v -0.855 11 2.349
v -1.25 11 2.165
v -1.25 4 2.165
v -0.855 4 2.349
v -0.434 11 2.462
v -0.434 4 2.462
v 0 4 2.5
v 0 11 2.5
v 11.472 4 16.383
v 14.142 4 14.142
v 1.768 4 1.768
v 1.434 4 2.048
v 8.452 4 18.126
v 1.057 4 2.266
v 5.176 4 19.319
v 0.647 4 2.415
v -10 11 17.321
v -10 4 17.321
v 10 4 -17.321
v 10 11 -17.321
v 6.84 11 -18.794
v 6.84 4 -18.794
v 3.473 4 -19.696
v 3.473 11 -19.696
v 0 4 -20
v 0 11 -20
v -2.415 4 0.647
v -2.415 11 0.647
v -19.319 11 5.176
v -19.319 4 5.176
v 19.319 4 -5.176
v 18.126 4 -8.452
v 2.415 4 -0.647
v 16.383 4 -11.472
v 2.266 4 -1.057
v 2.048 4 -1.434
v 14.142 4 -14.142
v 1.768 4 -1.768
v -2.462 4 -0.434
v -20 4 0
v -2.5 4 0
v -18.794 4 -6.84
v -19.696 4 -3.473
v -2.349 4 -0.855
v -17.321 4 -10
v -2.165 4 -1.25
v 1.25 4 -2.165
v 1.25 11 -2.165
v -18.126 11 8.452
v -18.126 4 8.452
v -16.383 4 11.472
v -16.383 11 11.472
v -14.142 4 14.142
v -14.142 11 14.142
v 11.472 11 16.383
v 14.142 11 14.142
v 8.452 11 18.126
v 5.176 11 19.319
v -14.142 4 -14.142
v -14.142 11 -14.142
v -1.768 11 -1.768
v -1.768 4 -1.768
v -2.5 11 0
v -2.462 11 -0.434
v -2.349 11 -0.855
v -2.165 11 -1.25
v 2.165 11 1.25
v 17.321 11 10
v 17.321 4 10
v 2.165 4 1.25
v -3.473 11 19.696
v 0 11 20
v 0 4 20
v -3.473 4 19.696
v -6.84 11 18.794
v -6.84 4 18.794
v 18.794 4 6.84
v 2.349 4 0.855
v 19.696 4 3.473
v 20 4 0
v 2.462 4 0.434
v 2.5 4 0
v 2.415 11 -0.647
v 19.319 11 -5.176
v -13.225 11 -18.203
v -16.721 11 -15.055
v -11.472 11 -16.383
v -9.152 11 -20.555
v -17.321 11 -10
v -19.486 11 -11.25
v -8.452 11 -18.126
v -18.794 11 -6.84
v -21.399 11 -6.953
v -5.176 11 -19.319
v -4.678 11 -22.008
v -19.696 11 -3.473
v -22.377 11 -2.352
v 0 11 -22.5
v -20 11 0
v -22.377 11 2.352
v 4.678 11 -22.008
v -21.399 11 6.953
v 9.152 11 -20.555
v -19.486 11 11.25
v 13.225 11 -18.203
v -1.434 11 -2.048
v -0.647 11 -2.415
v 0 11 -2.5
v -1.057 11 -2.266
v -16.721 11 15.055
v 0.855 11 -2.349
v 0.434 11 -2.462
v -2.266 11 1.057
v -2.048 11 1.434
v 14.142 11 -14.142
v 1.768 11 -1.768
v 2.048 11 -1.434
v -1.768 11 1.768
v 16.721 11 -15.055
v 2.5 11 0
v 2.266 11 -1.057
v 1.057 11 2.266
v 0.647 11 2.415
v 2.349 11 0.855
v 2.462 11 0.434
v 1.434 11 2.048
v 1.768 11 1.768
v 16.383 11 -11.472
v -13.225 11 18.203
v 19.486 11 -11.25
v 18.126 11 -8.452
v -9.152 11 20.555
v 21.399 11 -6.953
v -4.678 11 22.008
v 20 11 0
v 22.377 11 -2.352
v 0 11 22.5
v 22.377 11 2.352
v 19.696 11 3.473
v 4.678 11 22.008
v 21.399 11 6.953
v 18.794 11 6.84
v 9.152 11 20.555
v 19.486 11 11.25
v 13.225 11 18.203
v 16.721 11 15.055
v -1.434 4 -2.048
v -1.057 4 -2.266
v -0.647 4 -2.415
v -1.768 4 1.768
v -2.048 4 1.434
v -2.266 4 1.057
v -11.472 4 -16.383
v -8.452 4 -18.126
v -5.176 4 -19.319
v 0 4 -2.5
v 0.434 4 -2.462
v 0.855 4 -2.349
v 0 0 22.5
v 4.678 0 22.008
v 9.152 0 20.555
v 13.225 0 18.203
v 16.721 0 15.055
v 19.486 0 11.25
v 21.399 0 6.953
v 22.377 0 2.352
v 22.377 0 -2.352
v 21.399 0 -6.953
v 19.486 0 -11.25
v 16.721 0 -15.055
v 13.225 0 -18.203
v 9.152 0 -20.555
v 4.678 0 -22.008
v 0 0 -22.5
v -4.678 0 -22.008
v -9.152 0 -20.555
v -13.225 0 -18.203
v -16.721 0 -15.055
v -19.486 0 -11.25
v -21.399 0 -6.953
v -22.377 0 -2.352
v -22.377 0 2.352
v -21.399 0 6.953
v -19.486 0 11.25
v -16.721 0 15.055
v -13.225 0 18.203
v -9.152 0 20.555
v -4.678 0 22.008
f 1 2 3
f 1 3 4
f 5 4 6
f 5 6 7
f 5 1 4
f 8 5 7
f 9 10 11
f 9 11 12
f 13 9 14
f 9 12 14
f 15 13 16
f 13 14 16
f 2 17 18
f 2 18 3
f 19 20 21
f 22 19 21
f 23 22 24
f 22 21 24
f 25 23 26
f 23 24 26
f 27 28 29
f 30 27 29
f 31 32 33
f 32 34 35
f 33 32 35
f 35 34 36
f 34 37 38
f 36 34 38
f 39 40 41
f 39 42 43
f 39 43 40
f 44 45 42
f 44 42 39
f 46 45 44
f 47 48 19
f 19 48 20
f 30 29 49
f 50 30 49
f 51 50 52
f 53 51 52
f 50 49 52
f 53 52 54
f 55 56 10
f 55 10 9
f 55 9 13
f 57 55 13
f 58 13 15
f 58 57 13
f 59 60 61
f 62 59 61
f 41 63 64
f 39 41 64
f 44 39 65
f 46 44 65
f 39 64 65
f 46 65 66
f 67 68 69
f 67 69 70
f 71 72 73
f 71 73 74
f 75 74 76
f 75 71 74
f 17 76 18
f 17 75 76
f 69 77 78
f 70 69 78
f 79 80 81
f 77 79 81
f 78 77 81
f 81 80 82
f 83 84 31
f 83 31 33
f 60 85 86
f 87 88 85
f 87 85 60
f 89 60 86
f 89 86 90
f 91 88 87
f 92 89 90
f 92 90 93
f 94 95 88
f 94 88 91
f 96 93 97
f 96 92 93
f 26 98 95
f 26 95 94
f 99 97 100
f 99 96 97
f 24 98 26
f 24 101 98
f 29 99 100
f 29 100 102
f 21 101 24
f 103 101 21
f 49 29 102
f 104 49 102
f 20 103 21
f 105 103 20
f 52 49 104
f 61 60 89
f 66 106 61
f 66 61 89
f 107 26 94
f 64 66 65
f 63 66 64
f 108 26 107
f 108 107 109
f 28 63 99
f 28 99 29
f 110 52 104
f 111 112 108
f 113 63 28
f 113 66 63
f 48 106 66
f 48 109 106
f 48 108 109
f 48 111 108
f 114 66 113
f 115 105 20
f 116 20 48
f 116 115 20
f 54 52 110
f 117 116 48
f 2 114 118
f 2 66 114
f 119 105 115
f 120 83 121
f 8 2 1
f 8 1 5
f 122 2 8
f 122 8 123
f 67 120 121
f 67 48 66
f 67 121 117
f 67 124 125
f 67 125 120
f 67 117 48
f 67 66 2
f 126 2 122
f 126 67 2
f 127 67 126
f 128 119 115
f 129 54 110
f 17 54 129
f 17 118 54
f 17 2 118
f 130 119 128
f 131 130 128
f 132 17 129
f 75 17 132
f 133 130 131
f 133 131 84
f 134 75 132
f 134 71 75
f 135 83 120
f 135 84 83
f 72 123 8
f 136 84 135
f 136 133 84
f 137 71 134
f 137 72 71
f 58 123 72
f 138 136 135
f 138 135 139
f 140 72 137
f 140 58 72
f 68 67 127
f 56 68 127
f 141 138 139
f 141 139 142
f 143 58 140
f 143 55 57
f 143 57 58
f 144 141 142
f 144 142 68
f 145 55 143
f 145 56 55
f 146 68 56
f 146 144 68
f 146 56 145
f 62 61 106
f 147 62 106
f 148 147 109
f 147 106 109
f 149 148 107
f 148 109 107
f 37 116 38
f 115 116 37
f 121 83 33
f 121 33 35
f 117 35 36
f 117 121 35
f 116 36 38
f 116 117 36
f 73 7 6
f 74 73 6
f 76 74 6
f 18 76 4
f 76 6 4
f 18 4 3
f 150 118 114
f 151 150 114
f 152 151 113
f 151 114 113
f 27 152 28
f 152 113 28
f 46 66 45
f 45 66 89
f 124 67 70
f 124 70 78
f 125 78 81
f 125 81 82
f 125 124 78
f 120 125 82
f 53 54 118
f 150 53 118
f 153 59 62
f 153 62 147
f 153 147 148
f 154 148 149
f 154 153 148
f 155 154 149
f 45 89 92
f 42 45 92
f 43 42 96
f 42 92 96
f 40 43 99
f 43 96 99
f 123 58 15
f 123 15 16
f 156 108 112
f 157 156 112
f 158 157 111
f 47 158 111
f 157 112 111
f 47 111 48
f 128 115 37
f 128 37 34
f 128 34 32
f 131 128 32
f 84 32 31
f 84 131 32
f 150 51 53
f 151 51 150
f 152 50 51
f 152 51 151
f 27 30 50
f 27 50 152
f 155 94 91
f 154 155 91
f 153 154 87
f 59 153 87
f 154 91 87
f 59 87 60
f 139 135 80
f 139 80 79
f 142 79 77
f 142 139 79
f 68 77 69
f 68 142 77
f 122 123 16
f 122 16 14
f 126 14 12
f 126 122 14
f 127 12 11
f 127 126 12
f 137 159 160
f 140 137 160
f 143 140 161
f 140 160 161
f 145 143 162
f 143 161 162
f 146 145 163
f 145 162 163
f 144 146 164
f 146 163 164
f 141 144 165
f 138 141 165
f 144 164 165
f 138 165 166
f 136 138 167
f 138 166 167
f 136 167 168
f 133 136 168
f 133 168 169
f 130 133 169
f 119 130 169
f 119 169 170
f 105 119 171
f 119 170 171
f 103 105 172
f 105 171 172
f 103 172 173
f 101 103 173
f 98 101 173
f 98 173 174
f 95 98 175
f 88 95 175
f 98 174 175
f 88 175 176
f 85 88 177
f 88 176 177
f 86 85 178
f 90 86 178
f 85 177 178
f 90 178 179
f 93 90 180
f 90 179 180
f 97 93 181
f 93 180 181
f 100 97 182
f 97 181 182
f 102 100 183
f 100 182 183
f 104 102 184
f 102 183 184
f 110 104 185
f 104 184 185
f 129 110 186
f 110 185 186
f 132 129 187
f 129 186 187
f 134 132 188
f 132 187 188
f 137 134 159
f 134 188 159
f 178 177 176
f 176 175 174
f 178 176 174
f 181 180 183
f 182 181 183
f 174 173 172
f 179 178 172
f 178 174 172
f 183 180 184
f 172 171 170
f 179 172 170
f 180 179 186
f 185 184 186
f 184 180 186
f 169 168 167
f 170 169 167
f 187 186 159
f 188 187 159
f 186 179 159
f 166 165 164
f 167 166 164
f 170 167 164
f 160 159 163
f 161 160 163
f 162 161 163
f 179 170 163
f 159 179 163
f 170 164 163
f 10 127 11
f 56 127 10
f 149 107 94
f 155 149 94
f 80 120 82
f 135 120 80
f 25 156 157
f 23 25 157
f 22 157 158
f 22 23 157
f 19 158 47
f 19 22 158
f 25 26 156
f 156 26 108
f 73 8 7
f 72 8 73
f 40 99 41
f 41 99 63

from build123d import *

# Parameters (mm, degrees)
SKETCH1_R                                     = 22.5
MAIN_EXTRUDE_FOR_PLASTIC_MECHANSIM_PART_DEPTH = 11
MAIN_CUT_FOR_PLASTIC_MECHANISM_PART_DEPTH     = 7


with BuildPart() as part:
    # Sketch1 → Main Extrude for Plastic Mechansim Part (new body)
    with BuildSketch(Plane(origin=(0, 0, 0), x_dir=(1, 0, 0), z_dir=(0, 1, 0))):
        with Locations(Location((0, 0, 0), (0, 0, 270))):
            Circle(SKETCH1_R)
    extrude(amount=MAIN_EXTRUDE_FOR_PLASTIC_MECHANSIM_PART_DEPTH)

    # Sketch2 → Main Cut for Plastic Mechanism Part (cut)
    with BuildSketch(Plane(origin=(0, 11, 0), x_dir=(1, 0, 0), z_dir=(0, 1, 0))):
        with BuildLine():
            Line((0, 20), (0, 2.5))
            ThreePointArc((0, 2.5), (0.647047613, 2.414814566), (1.25, 2.165063509))
            Line((1.25, 2.165063509), (10, 17.320508076))
            ThreePointArc((10, 17.320508076), (5.176380902, 19.318516526), (0, 20))
        make_face()
        with BuildLine():
            Line((-20, 0), (-2.5, 0))
            ThreePointArc((-2.5, 0), (-2.414814566, 0.647047613), (-2.165063509, 1.25))
            Line((-2.165063509, 1.25), (-17.320508076, 10))
            ThreePointArc((-17.320508076, 10), (-19.318516526, 5.176380902), (-20, 0))
        make_face()
        with BuildLine():
            Line((-14.142135624, -14.142135624), (-1.767766953, -1.767766953))
            ThreePointArc((-1.767766953, -1.767766953), (-2.165063509, -1.25), (-2.414814566, -0.647047613))
            Line((-2.414814566, -0.647047613), (-19.318516526, -5.176380902))
            ThreePointArc((-19.318516526, -5.176380902), (-17.320508076, -10), (-14.142135624, -14.142135624))
        make_face()
        with BuildLine():
            Line((-14.142135624, 14.142135624), (-1.767766953, 1.767766953))
            ThreePointArc((-1.767766953, 1.767766953), (-1.25, 2.165063509), (-0.647047613, 2.414814566))
            Line((-0.647047613, 2.414814566), (-5.176380902, 19.318516526))
            ThreePointArc((-5.176380902, 19.318516526), (-10, 17.320508076), (-14.142135624, 14.142135624))
        make_face()
        with BuildLine():
            Line((0, -2.5), (0, -20))
            ThreePointArc((0, -20), (-5.176380902, -19.318516526), (-10, -17.320508076))
            Line((-10, -17.320508076), (-1.25, -2.165063509))
            ThreePointArc((-1.25, -2.165063509), (-0.647047613, -2.414814566), (0, -2.5))
        make_face()
        with BuildLine():
            Line((1.767766953, 1.767766953), (14.142135624, 14.142135624))
            ThreePointArc((14.142135624, 14.142135624), (17.320508076, 10), (19.318516526, 5.176380902))
            Line((19.318516526, 5.176380902), (2.414814566, 0.647047613))
            ThreePointArc((2.414814566, 0.647047613), (2.165063509, 1.25), (1.767766953, 1.767766953))
        make_face()
        with BuildLine():
            Line((2.5, 0), (20, 0))
            ThreePointArc((20, 0), (19.318516526, -5.176380902), (17.320508076, -10))
            Line((17.320508076, -10), (2.165063509, -1.25))
            ThreePointArc((2.165063509, -1.25), (2.414814566, -0.647047613), (2.5, 0))
        make_face()
        with BuildLine():
            Line((1.767766953, -1.767766953), (14.142135624, -14.142135624))
            ThreePointArc((14.142135624, -14.142135624), (10, -17.320508076), (5.176380902, -19.318516526))
            Line((5.176380902, -19.318516526), (0.647047613, -2.414814566))
            ThreePointArc((0.647047613, -2.414814566), (1.25, -2.165063509), (1.767766953, -1.767766953))
        make_face()
    extrude(amount=-MAIN_CUT_FOR_PLASTIC_MECHANISM_PART_DEPTH, mode=Mode.SUBTRACT)


solid = part.part
